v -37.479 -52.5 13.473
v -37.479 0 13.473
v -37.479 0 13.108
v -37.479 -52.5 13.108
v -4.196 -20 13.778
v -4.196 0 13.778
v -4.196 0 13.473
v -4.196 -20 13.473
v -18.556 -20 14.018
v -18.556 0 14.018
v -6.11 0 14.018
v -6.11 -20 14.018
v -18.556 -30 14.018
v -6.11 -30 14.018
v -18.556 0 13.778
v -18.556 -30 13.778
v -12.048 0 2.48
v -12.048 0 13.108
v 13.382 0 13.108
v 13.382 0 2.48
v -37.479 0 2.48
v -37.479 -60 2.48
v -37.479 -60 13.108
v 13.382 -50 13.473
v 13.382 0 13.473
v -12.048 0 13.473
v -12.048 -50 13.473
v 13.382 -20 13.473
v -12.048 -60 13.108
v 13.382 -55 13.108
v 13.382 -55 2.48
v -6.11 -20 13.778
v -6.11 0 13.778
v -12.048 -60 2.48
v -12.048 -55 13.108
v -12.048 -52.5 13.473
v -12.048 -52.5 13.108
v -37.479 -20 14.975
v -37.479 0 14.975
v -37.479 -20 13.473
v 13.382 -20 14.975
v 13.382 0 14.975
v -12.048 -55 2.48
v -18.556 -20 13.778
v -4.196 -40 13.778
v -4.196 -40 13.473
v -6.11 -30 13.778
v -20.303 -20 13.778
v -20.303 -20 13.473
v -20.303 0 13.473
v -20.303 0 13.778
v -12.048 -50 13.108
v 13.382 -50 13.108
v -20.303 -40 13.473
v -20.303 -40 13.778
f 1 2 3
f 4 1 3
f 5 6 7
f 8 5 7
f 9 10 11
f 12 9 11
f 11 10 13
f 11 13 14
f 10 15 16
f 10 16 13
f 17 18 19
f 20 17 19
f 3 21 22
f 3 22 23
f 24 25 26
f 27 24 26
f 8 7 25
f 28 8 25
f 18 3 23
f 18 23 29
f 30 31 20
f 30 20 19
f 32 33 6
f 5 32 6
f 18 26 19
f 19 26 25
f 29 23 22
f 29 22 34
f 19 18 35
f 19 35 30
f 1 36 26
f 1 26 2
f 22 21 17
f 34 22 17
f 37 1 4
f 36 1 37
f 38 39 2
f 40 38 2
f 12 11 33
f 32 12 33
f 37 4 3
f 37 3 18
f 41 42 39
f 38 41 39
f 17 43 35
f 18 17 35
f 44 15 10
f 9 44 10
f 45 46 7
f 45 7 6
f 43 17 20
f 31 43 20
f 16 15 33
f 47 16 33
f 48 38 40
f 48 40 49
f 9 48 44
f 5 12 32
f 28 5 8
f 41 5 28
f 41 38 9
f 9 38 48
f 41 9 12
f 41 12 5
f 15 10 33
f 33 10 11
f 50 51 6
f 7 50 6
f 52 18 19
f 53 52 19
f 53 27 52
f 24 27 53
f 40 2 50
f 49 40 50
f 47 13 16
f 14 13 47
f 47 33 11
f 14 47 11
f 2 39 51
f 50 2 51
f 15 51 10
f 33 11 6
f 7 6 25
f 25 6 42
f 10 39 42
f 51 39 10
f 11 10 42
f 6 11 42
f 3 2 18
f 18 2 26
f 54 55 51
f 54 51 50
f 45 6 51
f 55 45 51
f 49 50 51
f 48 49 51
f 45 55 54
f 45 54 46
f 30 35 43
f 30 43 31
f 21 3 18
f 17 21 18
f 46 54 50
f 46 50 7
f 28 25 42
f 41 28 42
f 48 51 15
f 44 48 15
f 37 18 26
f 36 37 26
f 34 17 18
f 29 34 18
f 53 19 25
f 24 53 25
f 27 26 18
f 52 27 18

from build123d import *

# Parameters (mm, degrees)
F0_W     = 25.430768
F0_H     = 10.628652
F1_DEPTH = 60
F0_W_2   = 25.430769
F2_DEPTH = 55
F3_DEPTH = 50
F4_DEPTH = 52.5
F5_DEPTH = 40
F0_W_3   = 12.445013
F0_H_2   = 0.239326
F6_DEPTH = 30
F7_DEPTH = 20


with BuildPart() as f1:
    # F0 (on Front) → F1 (new body)
    with BuildSketch(Plane.XZ):
        with Locations((-24.763823, 7.793959)):
            Rectangle(F0_W, F0_H)
    extrude(amount=F1_DEPTH)


with BuildPart() as f2:
    # F0 (on Front) → F2 (new body)
    with BuildSketch(Plane.XZ):
        with Locations((0.666945, 7.793959)):
            Rectangle(F0_W_2, F0_H)
    extrude(amount=F2_DEPTH)


with BuildPart() as f3:
    # F0 (on Front) → F3 (new body)
    with BuildSketch(Plane.XZ):
        Polygon((-4.195883, 13.47276), (-12.048439, 13.47276), (-12.048439, 13.108285), (13.38233, 13.108285), (13.38233, 13.47276), align=None)
    extrude(amount=F3_DEPTH)


with BuildPart() as f4:
    # F0 (on Front) → F4 (new body)
    with BuildSketch(Plane.XZ):
        Polygon((-20.302601, 13.47276), (-37.479207, 13.47276), (-37.479207, 13.108285), (-12.048439, 13.108285), (-12.048439, 13.47276), align=None)
    extrude(amount=F4_DEPTH)


with BuildPart() as f5:
    # F0 (on Front) → F5 (new body)
    with BuildSketch(Plane.XZ):
        Polygon((-20.302601, 13.778402), (-20.302601, 13.47276), (-12.048439, 13.47276), (-4.195883, 13.47276), (-4.195883, 13.778402), (-6.1105, 13.778402), (-18.555513, 13.778402), align=None)
    extrude(amount=F5_DEPTH)


with BuildPart() as f6:
    # F0 (on Front) → F6 (new body)
    with BuildSketch(Plane.XZ):
        with Locations((-12.333006, 13.898065)):
            Rectangle(F0_W_3, F0_H_2)
    extrude(amount=F6_DEPTH)


with BuildPart() as f7:
    # F0 (on Front) → F7 (new body)
    with BuildSketch(Plane.XZ):
        Polygon((-37.479207, 14.975037), (-37.479207, 13.47276), (-20.302601, 13.47276), (-20.302601, 13.778402), (-18.555513, 13.778402), (-18.555513, 14.017728), (-6.1105, 14.017728), (-6.1105, 13.778402), (-4.195883, 13.778402), (-4.195883, 13.47276), (13.38233, 13.47276), (13.38233, 14.975037), align=None)
    extrude(amount=F7_DEPTH)


solid = Compound([f1.part, f2.part, f3.part, f4.part, f5.part, f6.part, f7.part])
